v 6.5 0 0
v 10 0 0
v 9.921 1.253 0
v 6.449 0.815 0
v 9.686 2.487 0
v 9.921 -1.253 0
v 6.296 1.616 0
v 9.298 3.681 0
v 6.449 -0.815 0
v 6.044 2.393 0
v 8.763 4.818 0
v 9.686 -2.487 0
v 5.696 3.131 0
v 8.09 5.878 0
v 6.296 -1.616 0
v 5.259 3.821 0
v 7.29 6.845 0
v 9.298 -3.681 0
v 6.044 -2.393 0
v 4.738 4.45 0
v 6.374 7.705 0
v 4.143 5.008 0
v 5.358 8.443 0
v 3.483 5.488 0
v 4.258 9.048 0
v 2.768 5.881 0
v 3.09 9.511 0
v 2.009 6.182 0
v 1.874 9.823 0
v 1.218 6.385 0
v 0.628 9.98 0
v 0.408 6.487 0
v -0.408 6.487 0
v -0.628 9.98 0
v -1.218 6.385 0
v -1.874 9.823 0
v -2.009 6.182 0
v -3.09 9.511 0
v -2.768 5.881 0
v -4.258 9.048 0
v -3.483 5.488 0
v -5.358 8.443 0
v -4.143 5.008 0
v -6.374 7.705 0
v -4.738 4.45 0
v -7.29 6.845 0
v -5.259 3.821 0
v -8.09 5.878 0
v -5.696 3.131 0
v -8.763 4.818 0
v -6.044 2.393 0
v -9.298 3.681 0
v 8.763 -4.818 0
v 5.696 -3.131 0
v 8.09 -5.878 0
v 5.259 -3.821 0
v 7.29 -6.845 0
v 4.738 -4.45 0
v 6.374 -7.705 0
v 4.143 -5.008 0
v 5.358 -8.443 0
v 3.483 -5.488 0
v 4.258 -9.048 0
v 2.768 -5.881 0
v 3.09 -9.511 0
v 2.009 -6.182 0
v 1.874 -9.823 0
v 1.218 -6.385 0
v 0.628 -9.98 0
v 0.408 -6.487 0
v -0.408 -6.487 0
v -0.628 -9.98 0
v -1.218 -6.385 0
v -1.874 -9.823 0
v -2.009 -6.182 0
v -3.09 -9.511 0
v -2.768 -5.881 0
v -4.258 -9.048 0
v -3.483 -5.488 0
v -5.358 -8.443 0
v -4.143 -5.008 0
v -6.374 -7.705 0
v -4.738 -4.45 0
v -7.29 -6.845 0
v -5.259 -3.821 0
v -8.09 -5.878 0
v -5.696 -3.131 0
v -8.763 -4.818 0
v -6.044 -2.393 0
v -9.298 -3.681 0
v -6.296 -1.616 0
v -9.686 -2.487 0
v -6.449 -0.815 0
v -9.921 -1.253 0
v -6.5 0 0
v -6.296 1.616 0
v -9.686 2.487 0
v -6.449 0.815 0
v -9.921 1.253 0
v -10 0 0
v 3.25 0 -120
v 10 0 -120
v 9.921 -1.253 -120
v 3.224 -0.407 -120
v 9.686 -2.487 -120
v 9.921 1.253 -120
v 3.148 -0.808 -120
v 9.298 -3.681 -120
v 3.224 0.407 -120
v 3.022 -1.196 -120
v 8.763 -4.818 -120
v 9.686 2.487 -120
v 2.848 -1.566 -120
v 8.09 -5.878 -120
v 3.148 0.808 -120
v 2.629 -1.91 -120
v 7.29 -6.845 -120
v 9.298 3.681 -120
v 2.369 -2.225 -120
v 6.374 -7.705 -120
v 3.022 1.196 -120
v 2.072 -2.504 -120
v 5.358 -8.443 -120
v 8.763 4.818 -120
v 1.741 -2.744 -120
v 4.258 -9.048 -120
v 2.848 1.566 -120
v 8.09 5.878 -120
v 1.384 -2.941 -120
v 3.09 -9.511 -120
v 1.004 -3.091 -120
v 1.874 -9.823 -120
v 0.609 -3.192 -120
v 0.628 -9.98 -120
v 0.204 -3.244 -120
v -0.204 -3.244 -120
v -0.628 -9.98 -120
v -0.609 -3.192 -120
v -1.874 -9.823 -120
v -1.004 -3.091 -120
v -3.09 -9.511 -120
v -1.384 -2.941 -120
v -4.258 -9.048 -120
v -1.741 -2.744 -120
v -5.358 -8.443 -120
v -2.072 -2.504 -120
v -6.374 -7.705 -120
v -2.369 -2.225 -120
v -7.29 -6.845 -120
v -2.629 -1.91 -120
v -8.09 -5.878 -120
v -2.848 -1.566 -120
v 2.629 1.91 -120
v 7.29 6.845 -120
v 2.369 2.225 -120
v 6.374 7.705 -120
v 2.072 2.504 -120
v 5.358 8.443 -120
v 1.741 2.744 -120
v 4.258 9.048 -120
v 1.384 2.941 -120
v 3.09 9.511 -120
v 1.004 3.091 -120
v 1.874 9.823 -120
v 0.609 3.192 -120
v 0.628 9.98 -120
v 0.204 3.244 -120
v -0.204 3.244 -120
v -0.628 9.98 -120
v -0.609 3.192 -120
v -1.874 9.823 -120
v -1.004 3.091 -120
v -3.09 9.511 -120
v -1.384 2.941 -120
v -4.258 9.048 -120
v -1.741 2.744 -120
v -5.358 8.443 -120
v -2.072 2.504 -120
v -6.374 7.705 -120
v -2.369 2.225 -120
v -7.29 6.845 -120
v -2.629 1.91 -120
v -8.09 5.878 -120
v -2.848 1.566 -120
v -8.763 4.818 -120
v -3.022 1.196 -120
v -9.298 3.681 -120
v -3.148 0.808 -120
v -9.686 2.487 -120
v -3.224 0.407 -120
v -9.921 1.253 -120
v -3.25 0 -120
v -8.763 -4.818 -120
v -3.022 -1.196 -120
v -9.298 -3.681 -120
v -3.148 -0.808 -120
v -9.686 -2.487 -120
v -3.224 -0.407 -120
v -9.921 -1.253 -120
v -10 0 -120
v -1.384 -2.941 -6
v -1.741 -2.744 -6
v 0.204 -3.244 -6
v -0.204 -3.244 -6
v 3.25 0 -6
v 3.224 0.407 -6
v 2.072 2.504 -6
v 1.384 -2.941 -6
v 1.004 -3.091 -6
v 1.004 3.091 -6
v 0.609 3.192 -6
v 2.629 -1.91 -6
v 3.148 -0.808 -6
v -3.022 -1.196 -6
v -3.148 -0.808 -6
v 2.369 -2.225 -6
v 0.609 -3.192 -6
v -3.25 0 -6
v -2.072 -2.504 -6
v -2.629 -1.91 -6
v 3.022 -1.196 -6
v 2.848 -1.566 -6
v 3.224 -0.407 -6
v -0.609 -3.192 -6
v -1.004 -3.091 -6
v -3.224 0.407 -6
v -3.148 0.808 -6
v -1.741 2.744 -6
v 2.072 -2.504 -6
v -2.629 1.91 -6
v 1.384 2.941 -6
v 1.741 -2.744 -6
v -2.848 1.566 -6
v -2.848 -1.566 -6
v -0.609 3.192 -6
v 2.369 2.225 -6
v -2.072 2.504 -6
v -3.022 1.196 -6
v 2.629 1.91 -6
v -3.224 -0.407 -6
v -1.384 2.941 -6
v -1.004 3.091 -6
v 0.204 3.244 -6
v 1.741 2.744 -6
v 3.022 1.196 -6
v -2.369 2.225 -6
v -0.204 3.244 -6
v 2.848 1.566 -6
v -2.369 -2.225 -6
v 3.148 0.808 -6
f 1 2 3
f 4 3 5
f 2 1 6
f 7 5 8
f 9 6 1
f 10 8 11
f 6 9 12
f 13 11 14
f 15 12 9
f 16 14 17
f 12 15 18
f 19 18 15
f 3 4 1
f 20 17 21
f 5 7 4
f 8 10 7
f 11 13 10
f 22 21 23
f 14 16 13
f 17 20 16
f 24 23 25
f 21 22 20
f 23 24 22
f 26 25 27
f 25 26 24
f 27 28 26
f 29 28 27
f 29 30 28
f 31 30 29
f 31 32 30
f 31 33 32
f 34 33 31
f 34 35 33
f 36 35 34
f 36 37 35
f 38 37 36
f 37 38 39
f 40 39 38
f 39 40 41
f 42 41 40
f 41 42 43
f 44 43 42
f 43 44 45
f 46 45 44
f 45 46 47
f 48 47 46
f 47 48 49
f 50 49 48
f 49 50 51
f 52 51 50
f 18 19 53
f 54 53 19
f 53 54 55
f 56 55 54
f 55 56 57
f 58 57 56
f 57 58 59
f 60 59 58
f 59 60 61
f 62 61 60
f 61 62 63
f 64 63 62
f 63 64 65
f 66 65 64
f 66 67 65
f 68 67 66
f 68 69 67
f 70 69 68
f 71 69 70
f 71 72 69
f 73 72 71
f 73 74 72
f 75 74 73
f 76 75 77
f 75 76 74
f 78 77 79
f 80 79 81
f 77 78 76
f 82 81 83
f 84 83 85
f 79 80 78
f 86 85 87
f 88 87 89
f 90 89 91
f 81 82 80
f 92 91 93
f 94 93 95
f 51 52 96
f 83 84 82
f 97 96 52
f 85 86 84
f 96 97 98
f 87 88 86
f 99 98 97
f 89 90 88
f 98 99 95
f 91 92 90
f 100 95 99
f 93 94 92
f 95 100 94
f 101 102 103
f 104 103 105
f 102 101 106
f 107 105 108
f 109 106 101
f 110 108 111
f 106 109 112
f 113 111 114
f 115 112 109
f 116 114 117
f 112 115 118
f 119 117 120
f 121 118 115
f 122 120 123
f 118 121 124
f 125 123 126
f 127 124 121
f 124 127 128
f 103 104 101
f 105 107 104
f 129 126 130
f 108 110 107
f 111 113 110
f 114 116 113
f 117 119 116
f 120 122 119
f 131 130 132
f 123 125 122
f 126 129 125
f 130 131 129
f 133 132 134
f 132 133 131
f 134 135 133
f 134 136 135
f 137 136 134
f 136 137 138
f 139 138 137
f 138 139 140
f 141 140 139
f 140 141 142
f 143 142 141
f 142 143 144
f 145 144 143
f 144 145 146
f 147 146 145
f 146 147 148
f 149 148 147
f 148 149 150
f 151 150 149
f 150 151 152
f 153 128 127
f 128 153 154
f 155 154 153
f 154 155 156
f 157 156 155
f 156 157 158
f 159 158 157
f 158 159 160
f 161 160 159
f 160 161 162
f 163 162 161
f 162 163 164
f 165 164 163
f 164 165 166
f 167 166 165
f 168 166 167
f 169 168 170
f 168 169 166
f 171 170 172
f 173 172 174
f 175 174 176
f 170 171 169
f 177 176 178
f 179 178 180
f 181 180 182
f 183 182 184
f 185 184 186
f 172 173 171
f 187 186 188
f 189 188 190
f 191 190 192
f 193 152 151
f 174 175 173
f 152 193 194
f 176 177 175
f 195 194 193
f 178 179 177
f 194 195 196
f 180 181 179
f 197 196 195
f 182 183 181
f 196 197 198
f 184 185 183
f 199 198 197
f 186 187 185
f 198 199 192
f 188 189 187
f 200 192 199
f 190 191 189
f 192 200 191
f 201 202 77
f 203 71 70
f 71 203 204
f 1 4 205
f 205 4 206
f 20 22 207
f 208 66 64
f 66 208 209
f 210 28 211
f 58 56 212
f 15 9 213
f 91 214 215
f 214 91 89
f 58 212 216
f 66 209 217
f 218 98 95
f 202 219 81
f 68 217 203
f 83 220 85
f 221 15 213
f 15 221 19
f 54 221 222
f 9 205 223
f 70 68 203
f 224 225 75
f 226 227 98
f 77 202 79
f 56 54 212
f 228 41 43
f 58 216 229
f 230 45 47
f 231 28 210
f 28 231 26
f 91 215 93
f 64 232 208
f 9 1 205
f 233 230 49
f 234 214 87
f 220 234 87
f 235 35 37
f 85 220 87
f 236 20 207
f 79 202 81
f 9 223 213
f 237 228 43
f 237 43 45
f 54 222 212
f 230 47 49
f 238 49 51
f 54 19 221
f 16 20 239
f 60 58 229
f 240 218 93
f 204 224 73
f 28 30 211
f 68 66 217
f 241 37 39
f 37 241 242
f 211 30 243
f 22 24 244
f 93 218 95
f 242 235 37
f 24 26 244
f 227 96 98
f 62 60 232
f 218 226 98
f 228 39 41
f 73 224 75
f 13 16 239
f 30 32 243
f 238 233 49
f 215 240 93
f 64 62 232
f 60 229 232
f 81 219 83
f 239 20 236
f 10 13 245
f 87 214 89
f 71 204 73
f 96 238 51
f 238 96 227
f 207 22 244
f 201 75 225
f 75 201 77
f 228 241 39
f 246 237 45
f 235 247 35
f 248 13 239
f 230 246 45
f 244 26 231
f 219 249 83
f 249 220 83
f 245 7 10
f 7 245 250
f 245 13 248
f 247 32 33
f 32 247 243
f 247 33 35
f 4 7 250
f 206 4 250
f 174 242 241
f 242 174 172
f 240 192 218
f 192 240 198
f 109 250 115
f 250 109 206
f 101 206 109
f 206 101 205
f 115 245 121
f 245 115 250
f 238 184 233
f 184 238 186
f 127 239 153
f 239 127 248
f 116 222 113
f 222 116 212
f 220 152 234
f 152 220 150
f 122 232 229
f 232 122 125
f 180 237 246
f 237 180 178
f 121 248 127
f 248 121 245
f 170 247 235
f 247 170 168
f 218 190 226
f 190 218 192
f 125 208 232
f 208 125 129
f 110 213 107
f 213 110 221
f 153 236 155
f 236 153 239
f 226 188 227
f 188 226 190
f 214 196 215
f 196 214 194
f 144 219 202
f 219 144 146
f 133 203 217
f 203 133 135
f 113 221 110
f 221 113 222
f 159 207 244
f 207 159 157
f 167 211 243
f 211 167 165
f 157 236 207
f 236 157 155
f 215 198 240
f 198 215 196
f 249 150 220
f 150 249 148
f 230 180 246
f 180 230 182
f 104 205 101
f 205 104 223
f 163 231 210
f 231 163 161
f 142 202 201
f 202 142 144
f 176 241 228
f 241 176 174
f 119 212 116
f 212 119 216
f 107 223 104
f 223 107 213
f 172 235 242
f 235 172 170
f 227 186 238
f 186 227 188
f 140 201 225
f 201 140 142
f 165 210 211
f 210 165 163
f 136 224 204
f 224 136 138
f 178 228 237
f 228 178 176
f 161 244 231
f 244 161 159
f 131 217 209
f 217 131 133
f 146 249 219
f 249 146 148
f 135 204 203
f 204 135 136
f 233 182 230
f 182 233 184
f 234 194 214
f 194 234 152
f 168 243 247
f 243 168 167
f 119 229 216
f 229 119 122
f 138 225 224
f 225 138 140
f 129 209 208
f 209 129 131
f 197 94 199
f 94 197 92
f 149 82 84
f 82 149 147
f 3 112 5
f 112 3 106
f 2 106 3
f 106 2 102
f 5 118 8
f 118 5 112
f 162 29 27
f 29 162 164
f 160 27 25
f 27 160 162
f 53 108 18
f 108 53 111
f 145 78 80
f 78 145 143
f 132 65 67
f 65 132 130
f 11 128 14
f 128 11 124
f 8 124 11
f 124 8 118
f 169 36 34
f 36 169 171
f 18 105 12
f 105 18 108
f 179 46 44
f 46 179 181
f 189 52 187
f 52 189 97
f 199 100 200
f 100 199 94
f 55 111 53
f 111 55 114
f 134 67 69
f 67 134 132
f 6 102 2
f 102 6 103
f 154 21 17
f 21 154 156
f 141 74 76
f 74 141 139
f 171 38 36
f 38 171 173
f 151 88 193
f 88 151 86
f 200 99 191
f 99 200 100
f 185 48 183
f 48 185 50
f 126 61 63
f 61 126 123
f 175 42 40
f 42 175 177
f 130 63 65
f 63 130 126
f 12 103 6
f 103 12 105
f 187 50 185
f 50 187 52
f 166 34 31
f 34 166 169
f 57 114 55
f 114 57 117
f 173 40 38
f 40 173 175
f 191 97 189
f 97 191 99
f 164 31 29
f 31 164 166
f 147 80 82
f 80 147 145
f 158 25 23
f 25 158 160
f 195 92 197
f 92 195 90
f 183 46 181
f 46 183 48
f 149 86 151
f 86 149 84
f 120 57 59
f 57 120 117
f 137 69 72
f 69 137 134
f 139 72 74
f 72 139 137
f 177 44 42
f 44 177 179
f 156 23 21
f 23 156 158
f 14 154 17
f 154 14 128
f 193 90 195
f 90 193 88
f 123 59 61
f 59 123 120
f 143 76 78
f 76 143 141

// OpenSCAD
$fn = 50;


difference() {
	union() {
		translate(v = [0, 0, -120.0000000000]) {
			cylinder(h = 120, r = 10.0000000000);
		}
		cylinder(h = 0, r = 16.0000000000);
	}
	union() {
		translate(v = [0, 0, 0]) {
			rotate(a = [0, 0, 0]) {
				difference() {
					union() {
						#translate(v = [0, 0, -120.0000000000]) {
							cylinder(h = 120, r = 2.2500000000);
						}
						#translate(v = [0, 0, -6]) {
							cylinder(h = 6, r = 10.0000000000, r1 = 3.2500000000, r2 = 6.5000000000);
						}
						#translate(v = [0, 0, -120.0000000000]) {
							cylinder(h = 120, r = 3.2500000000);
						}
						#translate(v = [0, 0, -120.0000000000]) {
							cylinder(h = 120, r = 2.2500000000);
						}
					}
					union();
				}
			}
		}
	}
}
